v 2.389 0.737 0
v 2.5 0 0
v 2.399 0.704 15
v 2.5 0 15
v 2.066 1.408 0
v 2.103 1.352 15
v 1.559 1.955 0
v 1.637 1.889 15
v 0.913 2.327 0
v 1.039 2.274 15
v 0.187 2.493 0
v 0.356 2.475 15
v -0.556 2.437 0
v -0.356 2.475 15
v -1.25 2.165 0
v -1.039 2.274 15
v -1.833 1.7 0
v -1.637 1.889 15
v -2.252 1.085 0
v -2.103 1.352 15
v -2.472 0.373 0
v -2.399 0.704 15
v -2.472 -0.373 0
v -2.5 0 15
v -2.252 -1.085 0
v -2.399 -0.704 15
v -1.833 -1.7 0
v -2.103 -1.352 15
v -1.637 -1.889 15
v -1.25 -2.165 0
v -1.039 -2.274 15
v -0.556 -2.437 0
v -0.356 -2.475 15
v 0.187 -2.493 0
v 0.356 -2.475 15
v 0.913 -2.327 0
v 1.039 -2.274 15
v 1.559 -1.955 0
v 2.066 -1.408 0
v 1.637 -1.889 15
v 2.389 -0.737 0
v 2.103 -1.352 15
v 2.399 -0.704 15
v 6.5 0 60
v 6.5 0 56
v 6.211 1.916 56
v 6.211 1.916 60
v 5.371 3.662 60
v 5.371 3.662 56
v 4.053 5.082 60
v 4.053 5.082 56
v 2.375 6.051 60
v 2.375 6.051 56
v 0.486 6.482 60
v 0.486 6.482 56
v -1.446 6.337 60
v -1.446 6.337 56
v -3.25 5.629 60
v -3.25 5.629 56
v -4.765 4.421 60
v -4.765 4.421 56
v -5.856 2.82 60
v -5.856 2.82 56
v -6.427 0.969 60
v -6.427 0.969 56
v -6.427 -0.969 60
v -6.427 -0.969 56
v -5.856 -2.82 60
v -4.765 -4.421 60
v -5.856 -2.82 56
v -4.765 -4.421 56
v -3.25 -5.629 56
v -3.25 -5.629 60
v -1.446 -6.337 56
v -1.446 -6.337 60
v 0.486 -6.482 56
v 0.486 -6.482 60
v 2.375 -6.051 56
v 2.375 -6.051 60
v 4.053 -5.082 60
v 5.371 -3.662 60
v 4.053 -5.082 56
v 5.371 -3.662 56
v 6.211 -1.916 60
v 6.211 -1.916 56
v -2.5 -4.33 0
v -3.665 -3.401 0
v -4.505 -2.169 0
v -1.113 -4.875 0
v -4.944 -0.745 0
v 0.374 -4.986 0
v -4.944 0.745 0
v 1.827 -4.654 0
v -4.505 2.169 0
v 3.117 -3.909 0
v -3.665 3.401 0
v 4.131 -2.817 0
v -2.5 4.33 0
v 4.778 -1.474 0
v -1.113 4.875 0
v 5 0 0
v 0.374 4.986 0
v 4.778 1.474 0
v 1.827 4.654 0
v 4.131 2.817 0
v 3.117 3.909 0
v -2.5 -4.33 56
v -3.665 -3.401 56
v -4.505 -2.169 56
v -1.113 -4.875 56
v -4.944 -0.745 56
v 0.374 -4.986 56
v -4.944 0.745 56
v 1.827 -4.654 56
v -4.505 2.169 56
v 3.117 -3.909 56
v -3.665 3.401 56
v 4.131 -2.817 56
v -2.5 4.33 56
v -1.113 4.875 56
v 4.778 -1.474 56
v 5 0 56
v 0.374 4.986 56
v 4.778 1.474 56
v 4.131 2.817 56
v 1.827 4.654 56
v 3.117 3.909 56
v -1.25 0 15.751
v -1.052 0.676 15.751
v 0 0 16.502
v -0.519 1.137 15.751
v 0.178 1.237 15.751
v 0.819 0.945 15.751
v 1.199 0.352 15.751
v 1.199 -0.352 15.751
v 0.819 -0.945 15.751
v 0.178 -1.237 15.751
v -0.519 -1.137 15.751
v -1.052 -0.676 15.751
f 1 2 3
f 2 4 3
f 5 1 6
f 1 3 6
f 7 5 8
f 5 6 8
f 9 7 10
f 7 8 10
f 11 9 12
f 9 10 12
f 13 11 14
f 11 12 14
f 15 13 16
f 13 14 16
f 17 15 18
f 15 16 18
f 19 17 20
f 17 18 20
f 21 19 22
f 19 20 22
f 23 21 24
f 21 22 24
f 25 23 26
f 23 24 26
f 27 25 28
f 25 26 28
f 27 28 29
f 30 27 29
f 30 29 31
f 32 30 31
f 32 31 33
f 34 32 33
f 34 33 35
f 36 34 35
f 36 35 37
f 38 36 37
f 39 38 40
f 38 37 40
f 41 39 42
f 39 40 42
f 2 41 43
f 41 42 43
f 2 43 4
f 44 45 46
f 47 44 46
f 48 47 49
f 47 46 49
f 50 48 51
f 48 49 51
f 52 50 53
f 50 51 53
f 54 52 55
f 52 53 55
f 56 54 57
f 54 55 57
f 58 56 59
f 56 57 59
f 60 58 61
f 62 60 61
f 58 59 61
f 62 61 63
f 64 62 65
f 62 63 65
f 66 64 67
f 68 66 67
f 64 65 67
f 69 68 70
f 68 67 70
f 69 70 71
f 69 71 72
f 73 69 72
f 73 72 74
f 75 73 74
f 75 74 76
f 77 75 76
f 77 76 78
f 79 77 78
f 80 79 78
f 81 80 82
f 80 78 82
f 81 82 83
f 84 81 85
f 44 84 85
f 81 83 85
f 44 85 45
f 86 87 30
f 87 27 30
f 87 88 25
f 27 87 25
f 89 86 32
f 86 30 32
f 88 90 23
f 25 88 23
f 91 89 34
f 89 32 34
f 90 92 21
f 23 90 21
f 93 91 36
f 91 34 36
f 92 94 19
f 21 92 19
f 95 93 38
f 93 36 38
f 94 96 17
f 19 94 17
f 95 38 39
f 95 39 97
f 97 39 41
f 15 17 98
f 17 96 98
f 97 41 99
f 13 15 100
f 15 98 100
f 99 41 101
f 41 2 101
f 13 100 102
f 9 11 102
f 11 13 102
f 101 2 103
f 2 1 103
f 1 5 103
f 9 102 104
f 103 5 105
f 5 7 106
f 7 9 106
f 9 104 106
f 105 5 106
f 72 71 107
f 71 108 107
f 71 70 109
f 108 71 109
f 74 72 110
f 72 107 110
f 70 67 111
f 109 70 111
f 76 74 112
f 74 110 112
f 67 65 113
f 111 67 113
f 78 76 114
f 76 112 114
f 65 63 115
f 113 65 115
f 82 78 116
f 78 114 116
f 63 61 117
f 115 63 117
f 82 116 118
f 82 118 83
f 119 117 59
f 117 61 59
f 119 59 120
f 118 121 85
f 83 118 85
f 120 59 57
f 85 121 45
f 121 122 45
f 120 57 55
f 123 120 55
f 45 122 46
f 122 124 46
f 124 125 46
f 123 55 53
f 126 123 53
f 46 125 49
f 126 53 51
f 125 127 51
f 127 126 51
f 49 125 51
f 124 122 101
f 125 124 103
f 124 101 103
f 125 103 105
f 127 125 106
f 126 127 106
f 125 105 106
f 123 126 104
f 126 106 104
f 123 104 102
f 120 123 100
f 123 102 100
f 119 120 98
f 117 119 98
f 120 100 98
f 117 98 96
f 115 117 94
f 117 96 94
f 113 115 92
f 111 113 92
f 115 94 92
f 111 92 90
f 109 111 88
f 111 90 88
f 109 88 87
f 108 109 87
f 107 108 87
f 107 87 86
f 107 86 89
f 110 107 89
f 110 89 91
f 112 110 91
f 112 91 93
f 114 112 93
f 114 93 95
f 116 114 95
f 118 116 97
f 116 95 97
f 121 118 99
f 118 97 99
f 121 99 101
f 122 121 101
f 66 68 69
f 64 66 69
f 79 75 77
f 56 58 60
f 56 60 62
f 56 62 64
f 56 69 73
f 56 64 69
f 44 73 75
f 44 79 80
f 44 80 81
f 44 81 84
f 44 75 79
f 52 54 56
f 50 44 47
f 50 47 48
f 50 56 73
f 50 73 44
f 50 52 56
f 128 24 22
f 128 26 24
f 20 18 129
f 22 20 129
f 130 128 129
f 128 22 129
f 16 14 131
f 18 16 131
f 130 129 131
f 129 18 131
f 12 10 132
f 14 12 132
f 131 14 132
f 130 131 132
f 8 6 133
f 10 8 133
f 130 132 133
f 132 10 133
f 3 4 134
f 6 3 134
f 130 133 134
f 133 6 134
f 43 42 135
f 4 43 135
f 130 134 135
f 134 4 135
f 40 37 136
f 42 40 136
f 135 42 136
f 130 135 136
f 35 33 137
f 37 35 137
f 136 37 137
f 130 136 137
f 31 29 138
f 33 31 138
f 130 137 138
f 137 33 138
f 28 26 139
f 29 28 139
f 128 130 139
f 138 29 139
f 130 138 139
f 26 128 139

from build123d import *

# Parameters (mm, degrees)
SKETCH_1_R             = 5
EXTRUDE_1_DEPTH        = 56
SKETCH_2_R             = 6.5
EXTRUDE_2_DEPTH        = 4
HOLE_WIZARD_M6_1_D     = 5
HOLE_WIZARD_M6_1_DEPTH = 15
HOLE_WIZARD_M6_1_TIP   = 1.502151548


with BuildPart() as part:
    # 草图1 → 凸台-拉伸1 (new body)
    with BuildSketch(Plane.XY):
        Circle(SKETCH_1_R)
    extrude(amount=EXTRUDE_1_DEPTH)

    # 草图2 → 凸台-拉伸2 (add)
    with BuildSketch(Plane.XY.offset(56)):
        Circle(SKETCH_2_R)
    extrude(amount=EXTRUDE_2_DEPTH)

    # M6 螺纹孔1
    with Locations(Plane(origin=(0, 0, 0), x_dir=(-1, 0, 0), z_dir=(0, 0, -1))):
        with Locations((0, 0)):
            Hole(HOLE_WIZARD_M6_1_D / 2, depth=HOLE_WIZARD_M6_1_DEPTH)
            with Locations((0, 0, -(HOLE_WIZARD_M6_1_DEPTH + HOLE_WIZARD_M6_1_TIP / 2))):  # 118° drill point
                Cone(0, HOLE_WIZARD_M6_1_D / 2, HOLE_WIZARD_M6_1_TIP, mode=Mode.SUBTRACT)


solid = part.part
